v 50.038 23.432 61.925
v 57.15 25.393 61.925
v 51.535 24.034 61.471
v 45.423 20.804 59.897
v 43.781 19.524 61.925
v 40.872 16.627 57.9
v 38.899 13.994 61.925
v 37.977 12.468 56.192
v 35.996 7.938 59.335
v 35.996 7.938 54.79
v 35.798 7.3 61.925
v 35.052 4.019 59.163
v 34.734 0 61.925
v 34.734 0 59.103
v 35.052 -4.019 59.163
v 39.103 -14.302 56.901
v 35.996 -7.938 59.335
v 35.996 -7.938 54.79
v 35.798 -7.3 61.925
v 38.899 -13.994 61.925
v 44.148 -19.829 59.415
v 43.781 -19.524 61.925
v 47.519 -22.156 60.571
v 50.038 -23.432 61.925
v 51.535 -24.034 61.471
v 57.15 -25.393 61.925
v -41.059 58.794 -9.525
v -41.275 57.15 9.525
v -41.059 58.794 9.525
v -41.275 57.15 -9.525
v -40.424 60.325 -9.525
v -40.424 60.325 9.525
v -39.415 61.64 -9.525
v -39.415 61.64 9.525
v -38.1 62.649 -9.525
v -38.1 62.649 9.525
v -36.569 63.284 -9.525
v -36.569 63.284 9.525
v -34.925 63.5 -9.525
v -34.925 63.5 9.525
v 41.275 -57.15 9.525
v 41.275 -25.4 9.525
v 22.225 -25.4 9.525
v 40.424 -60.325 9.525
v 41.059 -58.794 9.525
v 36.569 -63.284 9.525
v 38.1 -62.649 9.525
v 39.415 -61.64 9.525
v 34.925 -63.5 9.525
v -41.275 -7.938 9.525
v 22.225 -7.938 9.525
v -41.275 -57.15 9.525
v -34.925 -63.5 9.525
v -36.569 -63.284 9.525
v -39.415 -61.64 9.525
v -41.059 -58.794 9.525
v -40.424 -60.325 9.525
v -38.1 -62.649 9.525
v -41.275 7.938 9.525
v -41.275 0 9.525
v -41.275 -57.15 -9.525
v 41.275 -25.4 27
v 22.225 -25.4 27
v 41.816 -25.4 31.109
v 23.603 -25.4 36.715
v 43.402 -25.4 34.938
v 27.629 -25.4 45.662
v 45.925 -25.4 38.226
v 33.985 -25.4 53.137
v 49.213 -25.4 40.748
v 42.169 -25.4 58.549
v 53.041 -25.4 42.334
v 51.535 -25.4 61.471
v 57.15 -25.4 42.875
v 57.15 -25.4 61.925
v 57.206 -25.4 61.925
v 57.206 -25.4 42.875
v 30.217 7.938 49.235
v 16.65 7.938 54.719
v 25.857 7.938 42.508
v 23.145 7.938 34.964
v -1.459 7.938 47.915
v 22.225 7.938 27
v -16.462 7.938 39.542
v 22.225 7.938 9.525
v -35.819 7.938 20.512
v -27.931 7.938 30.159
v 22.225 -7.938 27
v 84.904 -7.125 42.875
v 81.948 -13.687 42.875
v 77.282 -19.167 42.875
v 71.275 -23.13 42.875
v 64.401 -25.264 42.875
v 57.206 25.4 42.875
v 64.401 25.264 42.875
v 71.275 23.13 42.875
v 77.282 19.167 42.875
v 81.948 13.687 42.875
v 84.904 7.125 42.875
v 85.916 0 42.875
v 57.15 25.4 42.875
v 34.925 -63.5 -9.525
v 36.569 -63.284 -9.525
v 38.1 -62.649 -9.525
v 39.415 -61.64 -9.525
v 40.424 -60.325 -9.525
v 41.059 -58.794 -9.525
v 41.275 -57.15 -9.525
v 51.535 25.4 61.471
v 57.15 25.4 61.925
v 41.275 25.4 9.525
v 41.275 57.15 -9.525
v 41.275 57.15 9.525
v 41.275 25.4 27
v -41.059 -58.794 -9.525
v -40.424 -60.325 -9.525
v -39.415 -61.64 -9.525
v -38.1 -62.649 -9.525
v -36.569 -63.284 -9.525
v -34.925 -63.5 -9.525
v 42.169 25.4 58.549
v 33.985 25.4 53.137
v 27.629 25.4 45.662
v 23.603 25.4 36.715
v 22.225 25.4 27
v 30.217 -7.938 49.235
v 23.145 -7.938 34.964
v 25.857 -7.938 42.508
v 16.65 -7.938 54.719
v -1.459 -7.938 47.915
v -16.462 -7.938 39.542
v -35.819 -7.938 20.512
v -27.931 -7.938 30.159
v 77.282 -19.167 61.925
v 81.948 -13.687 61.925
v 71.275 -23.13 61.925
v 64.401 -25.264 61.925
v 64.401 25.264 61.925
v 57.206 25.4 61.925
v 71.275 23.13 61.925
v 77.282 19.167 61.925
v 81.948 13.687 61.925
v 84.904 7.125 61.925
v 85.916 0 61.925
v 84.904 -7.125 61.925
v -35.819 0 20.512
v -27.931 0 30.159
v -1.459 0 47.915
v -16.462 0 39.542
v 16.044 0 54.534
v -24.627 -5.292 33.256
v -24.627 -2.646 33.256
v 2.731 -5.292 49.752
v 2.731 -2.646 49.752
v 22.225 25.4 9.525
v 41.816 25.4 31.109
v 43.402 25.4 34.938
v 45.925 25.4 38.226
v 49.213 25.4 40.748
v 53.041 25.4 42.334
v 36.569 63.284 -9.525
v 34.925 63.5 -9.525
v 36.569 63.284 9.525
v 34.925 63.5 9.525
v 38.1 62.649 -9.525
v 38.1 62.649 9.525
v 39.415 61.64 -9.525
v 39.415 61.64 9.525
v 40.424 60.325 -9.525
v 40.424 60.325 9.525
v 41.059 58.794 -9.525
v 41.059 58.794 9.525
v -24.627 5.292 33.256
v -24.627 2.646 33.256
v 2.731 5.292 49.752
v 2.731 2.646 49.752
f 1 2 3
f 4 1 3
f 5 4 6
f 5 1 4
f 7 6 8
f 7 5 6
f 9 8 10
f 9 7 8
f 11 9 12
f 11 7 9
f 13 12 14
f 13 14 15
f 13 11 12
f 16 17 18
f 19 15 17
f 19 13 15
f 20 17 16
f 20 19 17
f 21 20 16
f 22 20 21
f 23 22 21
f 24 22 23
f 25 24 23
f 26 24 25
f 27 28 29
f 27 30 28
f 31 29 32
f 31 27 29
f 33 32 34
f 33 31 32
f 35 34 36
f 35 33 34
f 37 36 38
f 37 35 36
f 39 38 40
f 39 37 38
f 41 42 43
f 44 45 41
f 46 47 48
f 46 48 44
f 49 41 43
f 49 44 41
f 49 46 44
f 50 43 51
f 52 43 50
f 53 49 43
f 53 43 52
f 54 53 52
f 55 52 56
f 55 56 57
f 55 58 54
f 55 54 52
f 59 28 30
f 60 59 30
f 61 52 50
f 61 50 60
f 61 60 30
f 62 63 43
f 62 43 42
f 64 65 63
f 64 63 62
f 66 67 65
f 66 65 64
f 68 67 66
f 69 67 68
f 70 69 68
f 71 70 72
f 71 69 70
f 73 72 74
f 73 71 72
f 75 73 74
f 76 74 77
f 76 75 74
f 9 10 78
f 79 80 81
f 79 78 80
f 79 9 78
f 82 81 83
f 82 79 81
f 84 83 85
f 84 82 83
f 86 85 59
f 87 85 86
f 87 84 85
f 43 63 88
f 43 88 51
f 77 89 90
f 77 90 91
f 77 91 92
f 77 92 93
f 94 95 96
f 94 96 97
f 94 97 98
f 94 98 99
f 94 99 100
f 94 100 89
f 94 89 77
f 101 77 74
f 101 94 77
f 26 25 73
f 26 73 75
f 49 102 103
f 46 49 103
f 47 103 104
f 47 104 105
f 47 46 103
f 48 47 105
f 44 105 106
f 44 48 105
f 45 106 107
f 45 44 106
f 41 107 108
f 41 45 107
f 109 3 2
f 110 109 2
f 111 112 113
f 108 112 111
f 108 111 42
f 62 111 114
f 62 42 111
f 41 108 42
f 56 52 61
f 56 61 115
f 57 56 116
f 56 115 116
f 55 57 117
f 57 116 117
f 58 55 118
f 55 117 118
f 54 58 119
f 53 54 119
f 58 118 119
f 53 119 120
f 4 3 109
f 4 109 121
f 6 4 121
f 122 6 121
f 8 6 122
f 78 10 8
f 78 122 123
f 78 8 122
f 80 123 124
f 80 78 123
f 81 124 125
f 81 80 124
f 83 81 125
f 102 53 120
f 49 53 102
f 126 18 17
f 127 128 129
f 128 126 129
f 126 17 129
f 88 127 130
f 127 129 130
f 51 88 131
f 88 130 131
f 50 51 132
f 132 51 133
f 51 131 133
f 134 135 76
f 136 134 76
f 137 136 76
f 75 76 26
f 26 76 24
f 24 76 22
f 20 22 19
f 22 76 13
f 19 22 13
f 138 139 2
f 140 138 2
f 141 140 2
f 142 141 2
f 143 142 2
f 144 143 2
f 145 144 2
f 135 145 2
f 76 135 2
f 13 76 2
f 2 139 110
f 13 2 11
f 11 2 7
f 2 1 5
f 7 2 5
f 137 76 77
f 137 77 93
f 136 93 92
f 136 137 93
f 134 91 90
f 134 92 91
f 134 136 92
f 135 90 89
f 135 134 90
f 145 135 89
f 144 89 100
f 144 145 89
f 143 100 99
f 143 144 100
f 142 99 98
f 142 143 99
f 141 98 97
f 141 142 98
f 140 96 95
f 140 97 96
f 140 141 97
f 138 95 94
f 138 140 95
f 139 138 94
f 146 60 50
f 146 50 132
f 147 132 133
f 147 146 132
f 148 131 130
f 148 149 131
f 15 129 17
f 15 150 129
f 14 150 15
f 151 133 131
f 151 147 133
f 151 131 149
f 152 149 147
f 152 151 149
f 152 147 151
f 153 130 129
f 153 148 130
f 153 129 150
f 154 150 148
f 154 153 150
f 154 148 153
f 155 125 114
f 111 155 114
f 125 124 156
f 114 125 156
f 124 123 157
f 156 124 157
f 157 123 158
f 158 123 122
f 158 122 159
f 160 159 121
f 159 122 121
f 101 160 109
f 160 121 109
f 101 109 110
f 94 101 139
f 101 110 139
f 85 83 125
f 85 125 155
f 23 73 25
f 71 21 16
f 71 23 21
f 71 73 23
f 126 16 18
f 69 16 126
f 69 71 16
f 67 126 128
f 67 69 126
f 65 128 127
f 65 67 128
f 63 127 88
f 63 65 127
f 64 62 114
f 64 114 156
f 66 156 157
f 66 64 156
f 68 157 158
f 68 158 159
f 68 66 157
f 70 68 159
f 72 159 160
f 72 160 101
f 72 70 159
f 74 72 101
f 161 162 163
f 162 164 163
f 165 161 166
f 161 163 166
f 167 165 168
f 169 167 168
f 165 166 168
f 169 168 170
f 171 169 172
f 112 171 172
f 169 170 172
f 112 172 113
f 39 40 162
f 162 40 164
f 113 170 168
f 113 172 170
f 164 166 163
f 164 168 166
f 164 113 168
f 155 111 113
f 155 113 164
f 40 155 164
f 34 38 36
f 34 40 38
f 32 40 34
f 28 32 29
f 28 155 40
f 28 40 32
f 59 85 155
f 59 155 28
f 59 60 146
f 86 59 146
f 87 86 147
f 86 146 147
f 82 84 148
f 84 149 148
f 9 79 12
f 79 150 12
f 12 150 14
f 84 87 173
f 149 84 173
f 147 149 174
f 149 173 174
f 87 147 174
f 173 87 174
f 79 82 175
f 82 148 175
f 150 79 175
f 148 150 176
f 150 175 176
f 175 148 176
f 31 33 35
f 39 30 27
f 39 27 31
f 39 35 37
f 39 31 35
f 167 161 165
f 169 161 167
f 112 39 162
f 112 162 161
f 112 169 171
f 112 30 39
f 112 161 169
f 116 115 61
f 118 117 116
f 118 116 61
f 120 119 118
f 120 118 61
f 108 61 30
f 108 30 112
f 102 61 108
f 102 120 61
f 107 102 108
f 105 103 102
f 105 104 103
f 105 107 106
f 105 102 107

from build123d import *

# Parameters (mm, degrees)
F1_DEPTH = 63.5
F2_DEPTH = 25.4
F3_DEPTH = 7.9375
F0_W     = 25.5907994721
F0_H     = 19.05
F5_R     = 6.35


with BuildPart() as f1:
    # F0 (on Front) → F1 (new body, symmetric)
    with BuildSketch(Plane.XZ):
        Polygon((22.225, 9.525), (-41.275, 9.525), (-41.275, -9.525), (41.275, -9.525), (41.275, 9.525), align=None)
    extrude(amount=F1_DEPTH, both=True)

    # F0 (on Front) → F2 (join, symmetric)
    with BuildSketch(Plane.XZ):
        with BuildLine():
            Line((22.225, 27.0002), (22.225, 9.525))
            Line((22.225, 9.525), (41.275, 9.525))
            Line((41.275, 9.525), (41.275, 27.0002))
            ThreePointArc((41.275, 27.0002), (45.9246798487, 38.2255201513), (57.15, 42.8752))
            Line((57.15, 42.8752), (60.325, 42.8752))
            Line((60.325, 42.8752), (60.325, 61.9252))
            Line((60.325, 61.9252), (57.15, 61.9252))
            add(Edge.make_bspline(
                [(51.5354770489, 61.4709521971), (53.4127539881, 61.6507047986), (55.2854096398, 61.802043629), (57.15, 61.9252)],
                knots=[106.4817518013, 106.4817518013, 106.4817518013, 106.4817518013, 111.5045361635, 111.5045361635, 111.5045361635, 111.5045361635], degree=3))
            ThreePointArc((51.5354770489, 61.4709521971), (30.5432072671, 49.6239531251), (22.225, 27.0002))
        make_face()
    extrude(amount=F2_DEPTH, both=True)

    # F0 (on Front) → F3 (join, symmetric)
    with BuildSketch(Plane.XZ):
        with BuildLine():
            add(Edge.make_bspline(
                [(-41.275, 9.525), (-30.1370525235, 41.0795542305), (11.7376830989, 57.6602427342), (51.5354770489, 61.4709521971)],
                knots=[0, 0, 0, 0, 106.4817518013, 106.4817518013, 106.4817518013, 106.4817518013], degree=3))
            Line((-41.275, 9.525), (22.225, 9.525))
            Line((22.225, 9.525), (22.225, 27.0002))
            ThreePointArc((22.225, 27.0002), (30.5432072671, 49.6239531251), (51.5354770489, 61.4709521971))
        make_face()
    extrude(amount=F3_DEPTH, both=True)

    # F0 (on Front) → F4 (revolve)
    with BuildSketch(Plane.XZ):
        with Locations((73.120399736, 52.4002)):
            Rectangle(F0_W, F0_H)
    revolve(axis=Axis((60.325, 0, 52.3875), (0, 0, 1)))

    # F5
    f5_edges = [f1.edges().sort_by_distance(p)[0] for p in [
        (41.275, -63.5, 0),
        (-41.275, -63.5, 0),
        (-41.275, 63.5, 0),
        (41.275, 63.5, 0),
    ]]
    fillet(f5_edges, radius=F5_R)


solid = f1.part
